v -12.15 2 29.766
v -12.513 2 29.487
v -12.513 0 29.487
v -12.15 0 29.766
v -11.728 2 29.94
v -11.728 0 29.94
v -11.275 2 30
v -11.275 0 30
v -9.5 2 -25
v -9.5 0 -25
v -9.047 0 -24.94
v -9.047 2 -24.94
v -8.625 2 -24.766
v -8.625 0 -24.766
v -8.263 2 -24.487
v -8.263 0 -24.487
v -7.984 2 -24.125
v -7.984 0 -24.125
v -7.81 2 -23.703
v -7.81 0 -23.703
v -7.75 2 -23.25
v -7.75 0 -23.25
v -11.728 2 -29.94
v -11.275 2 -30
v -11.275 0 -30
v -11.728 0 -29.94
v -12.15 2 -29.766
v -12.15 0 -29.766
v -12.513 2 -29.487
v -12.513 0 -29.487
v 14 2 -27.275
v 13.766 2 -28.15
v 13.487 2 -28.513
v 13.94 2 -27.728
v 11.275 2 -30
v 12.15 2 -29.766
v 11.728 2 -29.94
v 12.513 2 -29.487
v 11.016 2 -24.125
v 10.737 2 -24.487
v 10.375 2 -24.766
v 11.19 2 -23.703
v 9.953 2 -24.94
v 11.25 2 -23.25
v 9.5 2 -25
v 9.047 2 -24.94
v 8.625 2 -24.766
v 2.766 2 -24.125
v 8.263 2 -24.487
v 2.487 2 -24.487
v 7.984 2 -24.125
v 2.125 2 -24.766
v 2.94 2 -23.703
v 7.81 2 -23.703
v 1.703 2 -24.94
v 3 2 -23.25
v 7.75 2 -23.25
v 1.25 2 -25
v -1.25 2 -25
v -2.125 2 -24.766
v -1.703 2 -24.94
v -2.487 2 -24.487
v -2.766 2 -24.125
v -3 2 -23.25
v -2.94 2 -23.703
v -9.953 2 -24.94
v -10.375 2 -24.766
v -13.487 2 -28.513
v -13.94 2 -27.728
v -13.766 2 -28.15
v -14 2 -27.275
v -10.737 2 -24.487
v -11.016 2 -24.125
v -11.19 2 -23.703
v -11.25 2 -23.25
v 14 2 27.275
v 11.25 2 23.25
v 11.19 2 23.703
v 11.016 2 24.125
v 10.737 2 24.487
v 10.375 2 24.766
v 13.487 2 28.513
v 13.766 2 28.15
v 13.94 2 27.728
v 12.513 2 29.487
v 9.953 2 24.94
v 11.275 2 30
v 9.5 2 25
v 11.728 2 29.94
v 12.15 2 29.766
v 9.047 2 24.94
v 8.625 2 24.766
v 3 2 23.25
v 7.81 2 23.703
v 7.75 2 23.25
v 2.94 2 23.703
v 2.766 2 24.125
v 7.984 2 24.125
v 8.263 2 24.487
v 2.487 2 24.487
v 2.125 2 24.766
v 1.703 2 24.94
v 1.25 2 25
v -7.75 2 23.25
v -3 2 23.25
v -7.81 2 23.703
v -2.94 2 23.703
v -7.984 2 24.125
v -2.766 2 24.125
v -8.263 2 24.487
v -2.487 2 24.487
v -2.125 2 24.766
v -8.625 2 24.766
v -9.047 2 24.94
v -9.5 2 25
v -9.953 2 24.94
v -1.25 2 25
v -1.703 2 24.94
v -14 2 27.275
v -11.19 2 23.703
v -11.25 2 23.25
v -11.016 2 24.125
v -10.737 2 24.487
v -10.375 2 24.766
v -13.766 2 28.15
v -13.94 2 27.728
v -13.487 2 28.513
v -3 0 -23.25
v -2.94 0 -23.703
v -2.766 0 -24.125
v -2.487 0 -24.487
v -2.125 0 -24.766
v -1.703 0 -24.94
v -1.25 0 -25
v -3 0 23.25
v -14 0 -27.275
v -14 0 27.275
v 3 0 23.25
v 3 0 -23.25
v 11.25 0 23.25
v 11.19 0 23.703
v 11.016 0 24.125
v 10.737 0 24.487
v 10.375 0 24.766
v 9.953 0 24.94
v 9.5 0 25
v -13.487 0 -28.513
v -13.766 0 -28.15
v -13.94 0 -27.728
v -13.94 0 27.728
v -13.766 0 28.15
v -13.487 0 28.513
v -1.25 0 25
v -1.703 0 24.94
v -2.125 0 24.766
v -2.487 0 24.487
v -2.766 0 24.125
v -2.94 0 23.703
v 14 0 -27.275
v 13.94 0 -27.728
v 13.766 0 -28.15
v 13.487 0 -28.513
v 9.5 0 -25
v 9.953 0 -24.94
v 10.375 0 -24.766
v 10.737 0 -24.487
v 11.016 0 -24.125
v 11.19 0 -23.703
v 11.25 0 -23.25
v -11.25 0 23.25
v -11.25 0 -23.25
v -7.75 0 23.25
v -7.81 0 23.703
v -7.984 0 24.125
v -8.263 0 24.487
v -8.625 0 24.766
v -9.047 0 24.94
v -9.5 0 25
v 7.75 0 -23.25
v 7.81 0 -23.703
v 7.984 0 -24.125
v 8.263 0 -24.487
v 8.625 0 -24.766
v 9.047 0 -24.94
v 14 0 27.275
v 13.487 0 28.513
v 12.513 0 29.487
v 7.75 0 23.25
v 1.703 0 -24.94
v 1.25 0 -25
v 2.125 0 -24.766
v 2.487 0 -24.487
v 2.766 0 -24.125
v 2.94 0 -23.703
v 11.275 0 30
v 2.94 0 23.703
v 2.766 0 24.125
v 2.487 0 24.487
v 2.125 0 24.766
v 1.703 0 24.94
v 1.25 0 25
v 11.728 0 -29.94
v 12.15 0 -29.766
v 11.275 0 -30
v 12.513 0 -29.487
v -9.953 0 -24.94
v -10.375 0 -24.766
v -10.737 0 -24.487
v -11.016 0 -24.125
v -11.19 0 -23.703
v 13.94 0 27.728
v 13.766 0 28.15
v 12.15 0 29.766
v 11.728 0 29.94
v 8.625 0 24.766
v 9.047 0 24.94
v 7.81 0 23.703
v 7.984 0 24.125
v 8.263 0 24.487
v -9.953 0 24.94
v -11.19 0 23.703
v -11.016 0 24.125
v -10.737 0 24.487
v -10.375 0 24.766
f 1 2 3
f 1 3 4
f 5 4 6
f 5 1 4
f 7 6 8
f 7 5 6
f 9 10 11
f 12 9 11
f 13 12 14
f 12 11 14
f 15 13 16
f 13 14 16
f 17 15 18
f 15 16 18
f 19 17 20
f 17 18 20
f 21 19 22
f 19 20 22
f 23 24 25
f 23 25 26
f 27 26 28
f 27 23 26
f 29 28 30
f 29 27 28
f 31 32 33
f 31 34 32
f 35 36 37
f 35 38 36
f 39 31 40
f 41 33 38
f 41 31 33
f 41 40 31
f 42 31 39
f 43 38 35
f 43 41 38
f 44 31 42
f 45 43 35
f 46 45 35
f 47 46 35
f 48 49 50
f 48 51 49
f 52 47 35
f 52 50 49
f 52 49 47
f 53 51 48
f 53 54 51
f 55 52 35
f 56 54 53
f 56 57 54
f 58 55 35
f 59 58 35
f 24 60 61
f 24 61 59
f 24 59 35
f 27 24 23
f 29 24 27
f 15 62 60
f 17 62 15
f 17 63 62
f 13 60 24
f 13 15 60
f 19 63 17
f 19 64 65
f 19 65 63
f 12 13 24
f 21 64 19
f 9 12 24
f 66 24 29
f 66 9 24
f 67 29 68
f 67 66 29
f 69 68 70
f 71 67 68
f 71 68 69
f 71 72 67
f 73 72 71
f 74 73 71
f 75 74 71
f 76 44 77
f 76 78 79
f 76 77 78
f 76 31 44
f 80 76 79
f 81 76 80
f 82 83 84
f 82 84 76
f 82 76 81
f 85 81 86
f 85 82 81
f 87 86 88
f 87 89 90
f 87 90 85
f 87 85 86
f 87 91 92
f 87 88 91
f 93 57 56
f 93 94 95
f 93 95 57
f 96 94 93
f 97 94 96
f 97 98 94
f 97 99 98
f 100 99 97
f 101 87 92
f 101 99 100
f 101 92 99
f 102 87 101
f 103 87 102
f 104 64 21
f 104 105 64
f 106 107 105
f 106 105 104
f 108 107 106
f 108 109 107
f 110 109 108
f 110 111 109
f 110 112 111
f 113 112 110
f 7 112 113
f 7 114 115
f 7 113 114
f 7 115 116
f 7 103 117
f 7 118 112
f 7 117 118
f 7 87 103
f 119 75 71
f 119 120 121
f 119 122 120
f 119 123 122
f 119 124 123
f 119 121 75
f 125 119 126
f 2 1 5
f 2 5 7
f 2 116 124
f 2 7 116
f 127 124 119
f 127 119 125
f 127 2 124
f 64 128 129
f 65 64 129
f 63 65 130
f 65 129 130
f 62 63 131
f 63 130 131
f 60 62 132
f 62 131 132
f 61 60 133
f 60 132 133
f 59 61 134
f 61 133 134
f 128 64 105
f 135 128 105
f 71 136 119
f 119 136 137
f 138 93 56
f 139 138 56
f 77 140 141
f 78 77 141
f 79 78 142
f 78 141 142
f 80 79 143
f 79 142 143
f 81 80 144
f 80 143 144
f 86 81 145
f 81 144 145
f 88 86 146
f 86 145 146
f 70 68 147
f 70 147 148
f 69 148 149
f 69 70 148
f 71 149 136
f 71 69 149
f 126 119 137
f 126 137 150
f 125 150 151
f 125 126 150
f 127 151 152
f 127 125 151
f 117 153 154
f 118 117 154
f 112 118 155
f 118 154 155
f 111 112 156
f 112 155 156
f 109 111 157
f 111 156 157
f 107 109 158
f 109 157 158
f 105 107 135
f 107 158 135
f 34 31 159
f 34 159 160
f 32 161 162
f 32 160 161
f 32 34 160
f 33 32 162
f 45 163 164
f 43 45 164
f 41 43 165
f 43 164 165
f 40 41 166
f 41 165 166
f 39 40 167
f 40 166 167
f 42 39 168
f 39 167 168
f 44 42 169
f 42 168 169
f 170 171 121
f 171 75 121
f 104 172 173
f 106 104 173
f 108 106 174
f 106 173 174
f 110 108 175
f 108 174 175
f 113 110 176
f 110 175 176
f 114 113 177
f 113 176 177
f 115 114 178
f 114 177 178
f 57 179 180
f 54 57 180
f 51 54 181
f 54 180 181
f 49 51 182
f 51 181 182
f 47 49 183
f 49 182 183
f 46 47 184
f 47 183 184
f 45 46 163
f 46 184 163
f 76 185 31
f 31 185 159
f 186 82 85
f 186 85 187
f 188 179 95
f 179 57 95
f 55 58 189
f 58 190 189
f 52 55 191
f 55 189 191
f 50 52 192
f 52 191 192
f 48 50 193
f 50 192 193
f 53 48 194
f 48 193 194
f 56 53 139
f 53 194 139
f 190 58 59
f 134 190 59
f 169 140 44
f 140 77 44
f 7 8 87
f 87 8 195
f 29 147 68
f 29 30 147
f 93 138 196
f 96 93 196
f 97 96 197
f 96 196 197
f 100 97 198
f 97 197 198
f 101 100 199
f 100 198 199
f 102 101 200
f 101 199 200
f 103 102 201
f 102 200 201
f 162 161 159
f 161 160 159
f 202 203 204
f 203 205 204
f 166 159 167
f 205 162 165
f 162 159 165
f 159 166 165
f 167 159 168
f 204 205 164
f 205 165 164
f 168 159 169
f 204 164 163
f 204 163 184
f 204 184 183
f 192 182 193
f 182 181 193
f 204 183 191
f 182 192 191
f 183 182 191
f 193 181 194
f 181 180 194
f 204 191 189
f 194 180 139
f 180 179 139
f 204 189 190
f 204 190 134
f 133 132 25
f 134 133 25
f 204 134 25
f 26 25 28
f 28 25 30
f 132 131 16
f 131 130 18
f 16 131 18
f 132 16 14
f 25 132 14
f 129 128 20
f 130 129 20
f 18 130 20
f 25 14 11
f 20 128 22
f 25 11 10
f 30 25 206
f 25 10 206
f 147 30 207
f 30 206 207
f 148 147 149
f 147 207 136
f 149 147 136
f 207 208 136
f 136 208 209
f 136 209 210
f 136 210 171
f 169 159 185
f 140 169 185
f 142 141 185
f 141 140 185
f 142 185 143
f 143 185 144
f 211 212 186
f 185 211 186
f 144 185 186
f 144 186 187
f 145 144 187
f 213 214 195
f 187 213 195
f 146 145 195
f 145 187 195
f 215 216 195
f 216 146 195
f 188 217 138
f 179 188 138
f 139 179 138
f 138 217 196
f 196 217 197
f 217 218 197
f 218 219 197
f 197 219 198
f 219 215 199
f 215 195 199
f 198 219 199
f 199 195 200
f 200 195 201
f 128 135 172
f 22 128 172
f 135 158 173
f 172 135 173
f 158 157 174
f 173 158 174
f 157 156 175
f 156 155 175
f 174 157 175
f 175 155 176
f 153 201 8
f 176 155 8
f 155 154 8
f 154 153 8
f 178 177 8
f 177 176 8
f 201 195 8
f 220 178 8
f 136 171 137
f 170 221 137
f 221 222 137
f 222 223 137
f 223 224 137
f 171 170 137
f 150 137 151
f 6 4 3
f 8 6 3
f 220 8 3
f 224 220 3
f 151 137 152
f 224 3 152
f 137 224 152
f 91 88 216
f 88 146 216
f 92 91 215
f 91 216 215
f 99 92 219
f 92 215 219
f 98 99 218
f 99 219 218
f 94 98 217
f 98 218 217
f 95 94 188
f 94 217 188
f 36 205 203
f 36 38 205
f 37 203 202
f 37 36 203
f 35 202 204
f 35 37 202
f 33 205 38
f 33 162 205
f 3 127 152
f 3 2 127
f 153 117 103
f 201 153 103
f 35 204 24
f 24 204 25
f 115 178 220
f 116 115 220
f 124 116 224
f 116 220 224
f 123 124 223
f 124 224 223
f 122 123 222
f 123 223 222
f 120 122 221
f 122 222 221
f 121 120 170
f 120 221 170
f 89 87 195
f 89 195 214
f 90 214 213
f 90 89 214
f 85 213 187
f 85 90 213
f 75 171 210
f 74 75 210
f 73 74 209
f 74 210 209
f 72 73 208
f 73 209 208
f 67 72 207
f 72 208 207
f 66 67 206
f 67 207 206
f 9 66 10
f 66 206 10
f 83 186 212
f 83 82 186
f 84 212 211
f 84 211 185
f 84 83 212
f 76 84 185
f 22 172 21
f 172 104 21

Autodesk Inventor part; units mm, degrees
ref_plane "YZ Plane" through (0, 0, 0) normal (1, 0, 0) x (0, 1, 0)
ref_plane "XZ Plane" through (0, 0, 0) normal (0, 1, 0) x (-1, 0, 0)
ref_plane "XY Plane" through (0, 0, 0) normal (0, 0, 1) x (1, 0, 0)
sketch "Szkic1" plane through (0, 0, 0) normal (0, 1, 0) x (-1, 0, 0)
  line L0 (14, 30) -> (-14, 30)
  line L1 (-14, 30) -> (-14, -30)
  line L2 (-14, -30) -> (14, -30)
  line L3 (14, -30) -> (14, 30)
  point P0 (0, 0)
  dimension "d0" = 28
  dimension "d1" = 14
  dimension "d2" = 60
  dimension "d3" = 30
extrude "Wyciągnięcie proste1" add sketch "Szkic1" along normal blind 2
sketch "Szkic2" plane through (0, 2, 0) normal (0, 1, 0) x (1, 0, 0)
  line L0 (-11.25, -25) -> (-7.75, -25)
  line L1 (-7.75, -25) -> (-7.75, 25)
  line L2 (-7.75, 25) -> (-11.25, 25)
  line L3 (-11.25, 25) -> (-11.25, -25)
  line L4 (7.75, -25) -> (11.25, -25)
  line L5 (11.25, -25) -> (11.25, 25)
  line L6 (11.25, 25) -> (7.75, 25)
  line L7 (7.75, 25) -> (7.75, -25)
  line L8 (-14, -30) -> (14, -30) projected
  line L9 (14, 30) -> (-14, 30) projected
  point P0 (0, 0)
  dimension "d6" = 3.5
  dimension "d7" = 3.5
  dimension "d8" = 5
  dimension "d9" = 0
  dimension "d10" = 5
  dimension "d11" = 0
  dimension "d12" = 15.5
  dimension "d13" = 7.75
extrude "Wyciągnięcie proste2" cut sketch "Szkic2" against normal blind 2
chamfer "Faza1" distance 2 angle 45 4 edges at (-14, 1, 30) (-14, 1, -30) (14, 1, -30) (14, 1, 30)
sketch "Szkic3" plane through (0, 2, 0) normal (0, 1, 0) x (1, 0, 0)
  line L0 (-3, -25) -> (3, -25)
  line L1 (3, -25) -> (3, 25)
  line L2 (3, 25) -> (-3, 25)
  line L3 (-3, 25) -> (-3, -25)
  point P0 (0, 0)
  dimension "d19" = 50
  dimension "d20" = 25
  dimension "d21" = 6
  dimension "d22" = 3
extrude "Wyciągnięcie proste3" cut sketch "Szkic3" against normal blind 2
fillet "Zaokrąglenie1" radius 1.75 12 edges at (3, 1, 25) (-7.75, 1, 25) (-11.25, 1, 25) (-3, 1, 25) (7.75, 1, 25) (-11.25, 1, -25) (-7.75, 1, -25) (-3, 1, -25) (3, 1, -25) (7.75, 1, -25) (11.25, 1, -25) (11.25, 1, 25)
fillet "Zaokrąglenie2" radius 1.75 8 edges at (-12, 1, -30) (-14, 1, -28) (12, 1, -30) (14, 1, -28) (12, 1, 30) (14, 1, 28) (-12, 1, 30) (-14, 1, 28)
properties part number "Holder"
